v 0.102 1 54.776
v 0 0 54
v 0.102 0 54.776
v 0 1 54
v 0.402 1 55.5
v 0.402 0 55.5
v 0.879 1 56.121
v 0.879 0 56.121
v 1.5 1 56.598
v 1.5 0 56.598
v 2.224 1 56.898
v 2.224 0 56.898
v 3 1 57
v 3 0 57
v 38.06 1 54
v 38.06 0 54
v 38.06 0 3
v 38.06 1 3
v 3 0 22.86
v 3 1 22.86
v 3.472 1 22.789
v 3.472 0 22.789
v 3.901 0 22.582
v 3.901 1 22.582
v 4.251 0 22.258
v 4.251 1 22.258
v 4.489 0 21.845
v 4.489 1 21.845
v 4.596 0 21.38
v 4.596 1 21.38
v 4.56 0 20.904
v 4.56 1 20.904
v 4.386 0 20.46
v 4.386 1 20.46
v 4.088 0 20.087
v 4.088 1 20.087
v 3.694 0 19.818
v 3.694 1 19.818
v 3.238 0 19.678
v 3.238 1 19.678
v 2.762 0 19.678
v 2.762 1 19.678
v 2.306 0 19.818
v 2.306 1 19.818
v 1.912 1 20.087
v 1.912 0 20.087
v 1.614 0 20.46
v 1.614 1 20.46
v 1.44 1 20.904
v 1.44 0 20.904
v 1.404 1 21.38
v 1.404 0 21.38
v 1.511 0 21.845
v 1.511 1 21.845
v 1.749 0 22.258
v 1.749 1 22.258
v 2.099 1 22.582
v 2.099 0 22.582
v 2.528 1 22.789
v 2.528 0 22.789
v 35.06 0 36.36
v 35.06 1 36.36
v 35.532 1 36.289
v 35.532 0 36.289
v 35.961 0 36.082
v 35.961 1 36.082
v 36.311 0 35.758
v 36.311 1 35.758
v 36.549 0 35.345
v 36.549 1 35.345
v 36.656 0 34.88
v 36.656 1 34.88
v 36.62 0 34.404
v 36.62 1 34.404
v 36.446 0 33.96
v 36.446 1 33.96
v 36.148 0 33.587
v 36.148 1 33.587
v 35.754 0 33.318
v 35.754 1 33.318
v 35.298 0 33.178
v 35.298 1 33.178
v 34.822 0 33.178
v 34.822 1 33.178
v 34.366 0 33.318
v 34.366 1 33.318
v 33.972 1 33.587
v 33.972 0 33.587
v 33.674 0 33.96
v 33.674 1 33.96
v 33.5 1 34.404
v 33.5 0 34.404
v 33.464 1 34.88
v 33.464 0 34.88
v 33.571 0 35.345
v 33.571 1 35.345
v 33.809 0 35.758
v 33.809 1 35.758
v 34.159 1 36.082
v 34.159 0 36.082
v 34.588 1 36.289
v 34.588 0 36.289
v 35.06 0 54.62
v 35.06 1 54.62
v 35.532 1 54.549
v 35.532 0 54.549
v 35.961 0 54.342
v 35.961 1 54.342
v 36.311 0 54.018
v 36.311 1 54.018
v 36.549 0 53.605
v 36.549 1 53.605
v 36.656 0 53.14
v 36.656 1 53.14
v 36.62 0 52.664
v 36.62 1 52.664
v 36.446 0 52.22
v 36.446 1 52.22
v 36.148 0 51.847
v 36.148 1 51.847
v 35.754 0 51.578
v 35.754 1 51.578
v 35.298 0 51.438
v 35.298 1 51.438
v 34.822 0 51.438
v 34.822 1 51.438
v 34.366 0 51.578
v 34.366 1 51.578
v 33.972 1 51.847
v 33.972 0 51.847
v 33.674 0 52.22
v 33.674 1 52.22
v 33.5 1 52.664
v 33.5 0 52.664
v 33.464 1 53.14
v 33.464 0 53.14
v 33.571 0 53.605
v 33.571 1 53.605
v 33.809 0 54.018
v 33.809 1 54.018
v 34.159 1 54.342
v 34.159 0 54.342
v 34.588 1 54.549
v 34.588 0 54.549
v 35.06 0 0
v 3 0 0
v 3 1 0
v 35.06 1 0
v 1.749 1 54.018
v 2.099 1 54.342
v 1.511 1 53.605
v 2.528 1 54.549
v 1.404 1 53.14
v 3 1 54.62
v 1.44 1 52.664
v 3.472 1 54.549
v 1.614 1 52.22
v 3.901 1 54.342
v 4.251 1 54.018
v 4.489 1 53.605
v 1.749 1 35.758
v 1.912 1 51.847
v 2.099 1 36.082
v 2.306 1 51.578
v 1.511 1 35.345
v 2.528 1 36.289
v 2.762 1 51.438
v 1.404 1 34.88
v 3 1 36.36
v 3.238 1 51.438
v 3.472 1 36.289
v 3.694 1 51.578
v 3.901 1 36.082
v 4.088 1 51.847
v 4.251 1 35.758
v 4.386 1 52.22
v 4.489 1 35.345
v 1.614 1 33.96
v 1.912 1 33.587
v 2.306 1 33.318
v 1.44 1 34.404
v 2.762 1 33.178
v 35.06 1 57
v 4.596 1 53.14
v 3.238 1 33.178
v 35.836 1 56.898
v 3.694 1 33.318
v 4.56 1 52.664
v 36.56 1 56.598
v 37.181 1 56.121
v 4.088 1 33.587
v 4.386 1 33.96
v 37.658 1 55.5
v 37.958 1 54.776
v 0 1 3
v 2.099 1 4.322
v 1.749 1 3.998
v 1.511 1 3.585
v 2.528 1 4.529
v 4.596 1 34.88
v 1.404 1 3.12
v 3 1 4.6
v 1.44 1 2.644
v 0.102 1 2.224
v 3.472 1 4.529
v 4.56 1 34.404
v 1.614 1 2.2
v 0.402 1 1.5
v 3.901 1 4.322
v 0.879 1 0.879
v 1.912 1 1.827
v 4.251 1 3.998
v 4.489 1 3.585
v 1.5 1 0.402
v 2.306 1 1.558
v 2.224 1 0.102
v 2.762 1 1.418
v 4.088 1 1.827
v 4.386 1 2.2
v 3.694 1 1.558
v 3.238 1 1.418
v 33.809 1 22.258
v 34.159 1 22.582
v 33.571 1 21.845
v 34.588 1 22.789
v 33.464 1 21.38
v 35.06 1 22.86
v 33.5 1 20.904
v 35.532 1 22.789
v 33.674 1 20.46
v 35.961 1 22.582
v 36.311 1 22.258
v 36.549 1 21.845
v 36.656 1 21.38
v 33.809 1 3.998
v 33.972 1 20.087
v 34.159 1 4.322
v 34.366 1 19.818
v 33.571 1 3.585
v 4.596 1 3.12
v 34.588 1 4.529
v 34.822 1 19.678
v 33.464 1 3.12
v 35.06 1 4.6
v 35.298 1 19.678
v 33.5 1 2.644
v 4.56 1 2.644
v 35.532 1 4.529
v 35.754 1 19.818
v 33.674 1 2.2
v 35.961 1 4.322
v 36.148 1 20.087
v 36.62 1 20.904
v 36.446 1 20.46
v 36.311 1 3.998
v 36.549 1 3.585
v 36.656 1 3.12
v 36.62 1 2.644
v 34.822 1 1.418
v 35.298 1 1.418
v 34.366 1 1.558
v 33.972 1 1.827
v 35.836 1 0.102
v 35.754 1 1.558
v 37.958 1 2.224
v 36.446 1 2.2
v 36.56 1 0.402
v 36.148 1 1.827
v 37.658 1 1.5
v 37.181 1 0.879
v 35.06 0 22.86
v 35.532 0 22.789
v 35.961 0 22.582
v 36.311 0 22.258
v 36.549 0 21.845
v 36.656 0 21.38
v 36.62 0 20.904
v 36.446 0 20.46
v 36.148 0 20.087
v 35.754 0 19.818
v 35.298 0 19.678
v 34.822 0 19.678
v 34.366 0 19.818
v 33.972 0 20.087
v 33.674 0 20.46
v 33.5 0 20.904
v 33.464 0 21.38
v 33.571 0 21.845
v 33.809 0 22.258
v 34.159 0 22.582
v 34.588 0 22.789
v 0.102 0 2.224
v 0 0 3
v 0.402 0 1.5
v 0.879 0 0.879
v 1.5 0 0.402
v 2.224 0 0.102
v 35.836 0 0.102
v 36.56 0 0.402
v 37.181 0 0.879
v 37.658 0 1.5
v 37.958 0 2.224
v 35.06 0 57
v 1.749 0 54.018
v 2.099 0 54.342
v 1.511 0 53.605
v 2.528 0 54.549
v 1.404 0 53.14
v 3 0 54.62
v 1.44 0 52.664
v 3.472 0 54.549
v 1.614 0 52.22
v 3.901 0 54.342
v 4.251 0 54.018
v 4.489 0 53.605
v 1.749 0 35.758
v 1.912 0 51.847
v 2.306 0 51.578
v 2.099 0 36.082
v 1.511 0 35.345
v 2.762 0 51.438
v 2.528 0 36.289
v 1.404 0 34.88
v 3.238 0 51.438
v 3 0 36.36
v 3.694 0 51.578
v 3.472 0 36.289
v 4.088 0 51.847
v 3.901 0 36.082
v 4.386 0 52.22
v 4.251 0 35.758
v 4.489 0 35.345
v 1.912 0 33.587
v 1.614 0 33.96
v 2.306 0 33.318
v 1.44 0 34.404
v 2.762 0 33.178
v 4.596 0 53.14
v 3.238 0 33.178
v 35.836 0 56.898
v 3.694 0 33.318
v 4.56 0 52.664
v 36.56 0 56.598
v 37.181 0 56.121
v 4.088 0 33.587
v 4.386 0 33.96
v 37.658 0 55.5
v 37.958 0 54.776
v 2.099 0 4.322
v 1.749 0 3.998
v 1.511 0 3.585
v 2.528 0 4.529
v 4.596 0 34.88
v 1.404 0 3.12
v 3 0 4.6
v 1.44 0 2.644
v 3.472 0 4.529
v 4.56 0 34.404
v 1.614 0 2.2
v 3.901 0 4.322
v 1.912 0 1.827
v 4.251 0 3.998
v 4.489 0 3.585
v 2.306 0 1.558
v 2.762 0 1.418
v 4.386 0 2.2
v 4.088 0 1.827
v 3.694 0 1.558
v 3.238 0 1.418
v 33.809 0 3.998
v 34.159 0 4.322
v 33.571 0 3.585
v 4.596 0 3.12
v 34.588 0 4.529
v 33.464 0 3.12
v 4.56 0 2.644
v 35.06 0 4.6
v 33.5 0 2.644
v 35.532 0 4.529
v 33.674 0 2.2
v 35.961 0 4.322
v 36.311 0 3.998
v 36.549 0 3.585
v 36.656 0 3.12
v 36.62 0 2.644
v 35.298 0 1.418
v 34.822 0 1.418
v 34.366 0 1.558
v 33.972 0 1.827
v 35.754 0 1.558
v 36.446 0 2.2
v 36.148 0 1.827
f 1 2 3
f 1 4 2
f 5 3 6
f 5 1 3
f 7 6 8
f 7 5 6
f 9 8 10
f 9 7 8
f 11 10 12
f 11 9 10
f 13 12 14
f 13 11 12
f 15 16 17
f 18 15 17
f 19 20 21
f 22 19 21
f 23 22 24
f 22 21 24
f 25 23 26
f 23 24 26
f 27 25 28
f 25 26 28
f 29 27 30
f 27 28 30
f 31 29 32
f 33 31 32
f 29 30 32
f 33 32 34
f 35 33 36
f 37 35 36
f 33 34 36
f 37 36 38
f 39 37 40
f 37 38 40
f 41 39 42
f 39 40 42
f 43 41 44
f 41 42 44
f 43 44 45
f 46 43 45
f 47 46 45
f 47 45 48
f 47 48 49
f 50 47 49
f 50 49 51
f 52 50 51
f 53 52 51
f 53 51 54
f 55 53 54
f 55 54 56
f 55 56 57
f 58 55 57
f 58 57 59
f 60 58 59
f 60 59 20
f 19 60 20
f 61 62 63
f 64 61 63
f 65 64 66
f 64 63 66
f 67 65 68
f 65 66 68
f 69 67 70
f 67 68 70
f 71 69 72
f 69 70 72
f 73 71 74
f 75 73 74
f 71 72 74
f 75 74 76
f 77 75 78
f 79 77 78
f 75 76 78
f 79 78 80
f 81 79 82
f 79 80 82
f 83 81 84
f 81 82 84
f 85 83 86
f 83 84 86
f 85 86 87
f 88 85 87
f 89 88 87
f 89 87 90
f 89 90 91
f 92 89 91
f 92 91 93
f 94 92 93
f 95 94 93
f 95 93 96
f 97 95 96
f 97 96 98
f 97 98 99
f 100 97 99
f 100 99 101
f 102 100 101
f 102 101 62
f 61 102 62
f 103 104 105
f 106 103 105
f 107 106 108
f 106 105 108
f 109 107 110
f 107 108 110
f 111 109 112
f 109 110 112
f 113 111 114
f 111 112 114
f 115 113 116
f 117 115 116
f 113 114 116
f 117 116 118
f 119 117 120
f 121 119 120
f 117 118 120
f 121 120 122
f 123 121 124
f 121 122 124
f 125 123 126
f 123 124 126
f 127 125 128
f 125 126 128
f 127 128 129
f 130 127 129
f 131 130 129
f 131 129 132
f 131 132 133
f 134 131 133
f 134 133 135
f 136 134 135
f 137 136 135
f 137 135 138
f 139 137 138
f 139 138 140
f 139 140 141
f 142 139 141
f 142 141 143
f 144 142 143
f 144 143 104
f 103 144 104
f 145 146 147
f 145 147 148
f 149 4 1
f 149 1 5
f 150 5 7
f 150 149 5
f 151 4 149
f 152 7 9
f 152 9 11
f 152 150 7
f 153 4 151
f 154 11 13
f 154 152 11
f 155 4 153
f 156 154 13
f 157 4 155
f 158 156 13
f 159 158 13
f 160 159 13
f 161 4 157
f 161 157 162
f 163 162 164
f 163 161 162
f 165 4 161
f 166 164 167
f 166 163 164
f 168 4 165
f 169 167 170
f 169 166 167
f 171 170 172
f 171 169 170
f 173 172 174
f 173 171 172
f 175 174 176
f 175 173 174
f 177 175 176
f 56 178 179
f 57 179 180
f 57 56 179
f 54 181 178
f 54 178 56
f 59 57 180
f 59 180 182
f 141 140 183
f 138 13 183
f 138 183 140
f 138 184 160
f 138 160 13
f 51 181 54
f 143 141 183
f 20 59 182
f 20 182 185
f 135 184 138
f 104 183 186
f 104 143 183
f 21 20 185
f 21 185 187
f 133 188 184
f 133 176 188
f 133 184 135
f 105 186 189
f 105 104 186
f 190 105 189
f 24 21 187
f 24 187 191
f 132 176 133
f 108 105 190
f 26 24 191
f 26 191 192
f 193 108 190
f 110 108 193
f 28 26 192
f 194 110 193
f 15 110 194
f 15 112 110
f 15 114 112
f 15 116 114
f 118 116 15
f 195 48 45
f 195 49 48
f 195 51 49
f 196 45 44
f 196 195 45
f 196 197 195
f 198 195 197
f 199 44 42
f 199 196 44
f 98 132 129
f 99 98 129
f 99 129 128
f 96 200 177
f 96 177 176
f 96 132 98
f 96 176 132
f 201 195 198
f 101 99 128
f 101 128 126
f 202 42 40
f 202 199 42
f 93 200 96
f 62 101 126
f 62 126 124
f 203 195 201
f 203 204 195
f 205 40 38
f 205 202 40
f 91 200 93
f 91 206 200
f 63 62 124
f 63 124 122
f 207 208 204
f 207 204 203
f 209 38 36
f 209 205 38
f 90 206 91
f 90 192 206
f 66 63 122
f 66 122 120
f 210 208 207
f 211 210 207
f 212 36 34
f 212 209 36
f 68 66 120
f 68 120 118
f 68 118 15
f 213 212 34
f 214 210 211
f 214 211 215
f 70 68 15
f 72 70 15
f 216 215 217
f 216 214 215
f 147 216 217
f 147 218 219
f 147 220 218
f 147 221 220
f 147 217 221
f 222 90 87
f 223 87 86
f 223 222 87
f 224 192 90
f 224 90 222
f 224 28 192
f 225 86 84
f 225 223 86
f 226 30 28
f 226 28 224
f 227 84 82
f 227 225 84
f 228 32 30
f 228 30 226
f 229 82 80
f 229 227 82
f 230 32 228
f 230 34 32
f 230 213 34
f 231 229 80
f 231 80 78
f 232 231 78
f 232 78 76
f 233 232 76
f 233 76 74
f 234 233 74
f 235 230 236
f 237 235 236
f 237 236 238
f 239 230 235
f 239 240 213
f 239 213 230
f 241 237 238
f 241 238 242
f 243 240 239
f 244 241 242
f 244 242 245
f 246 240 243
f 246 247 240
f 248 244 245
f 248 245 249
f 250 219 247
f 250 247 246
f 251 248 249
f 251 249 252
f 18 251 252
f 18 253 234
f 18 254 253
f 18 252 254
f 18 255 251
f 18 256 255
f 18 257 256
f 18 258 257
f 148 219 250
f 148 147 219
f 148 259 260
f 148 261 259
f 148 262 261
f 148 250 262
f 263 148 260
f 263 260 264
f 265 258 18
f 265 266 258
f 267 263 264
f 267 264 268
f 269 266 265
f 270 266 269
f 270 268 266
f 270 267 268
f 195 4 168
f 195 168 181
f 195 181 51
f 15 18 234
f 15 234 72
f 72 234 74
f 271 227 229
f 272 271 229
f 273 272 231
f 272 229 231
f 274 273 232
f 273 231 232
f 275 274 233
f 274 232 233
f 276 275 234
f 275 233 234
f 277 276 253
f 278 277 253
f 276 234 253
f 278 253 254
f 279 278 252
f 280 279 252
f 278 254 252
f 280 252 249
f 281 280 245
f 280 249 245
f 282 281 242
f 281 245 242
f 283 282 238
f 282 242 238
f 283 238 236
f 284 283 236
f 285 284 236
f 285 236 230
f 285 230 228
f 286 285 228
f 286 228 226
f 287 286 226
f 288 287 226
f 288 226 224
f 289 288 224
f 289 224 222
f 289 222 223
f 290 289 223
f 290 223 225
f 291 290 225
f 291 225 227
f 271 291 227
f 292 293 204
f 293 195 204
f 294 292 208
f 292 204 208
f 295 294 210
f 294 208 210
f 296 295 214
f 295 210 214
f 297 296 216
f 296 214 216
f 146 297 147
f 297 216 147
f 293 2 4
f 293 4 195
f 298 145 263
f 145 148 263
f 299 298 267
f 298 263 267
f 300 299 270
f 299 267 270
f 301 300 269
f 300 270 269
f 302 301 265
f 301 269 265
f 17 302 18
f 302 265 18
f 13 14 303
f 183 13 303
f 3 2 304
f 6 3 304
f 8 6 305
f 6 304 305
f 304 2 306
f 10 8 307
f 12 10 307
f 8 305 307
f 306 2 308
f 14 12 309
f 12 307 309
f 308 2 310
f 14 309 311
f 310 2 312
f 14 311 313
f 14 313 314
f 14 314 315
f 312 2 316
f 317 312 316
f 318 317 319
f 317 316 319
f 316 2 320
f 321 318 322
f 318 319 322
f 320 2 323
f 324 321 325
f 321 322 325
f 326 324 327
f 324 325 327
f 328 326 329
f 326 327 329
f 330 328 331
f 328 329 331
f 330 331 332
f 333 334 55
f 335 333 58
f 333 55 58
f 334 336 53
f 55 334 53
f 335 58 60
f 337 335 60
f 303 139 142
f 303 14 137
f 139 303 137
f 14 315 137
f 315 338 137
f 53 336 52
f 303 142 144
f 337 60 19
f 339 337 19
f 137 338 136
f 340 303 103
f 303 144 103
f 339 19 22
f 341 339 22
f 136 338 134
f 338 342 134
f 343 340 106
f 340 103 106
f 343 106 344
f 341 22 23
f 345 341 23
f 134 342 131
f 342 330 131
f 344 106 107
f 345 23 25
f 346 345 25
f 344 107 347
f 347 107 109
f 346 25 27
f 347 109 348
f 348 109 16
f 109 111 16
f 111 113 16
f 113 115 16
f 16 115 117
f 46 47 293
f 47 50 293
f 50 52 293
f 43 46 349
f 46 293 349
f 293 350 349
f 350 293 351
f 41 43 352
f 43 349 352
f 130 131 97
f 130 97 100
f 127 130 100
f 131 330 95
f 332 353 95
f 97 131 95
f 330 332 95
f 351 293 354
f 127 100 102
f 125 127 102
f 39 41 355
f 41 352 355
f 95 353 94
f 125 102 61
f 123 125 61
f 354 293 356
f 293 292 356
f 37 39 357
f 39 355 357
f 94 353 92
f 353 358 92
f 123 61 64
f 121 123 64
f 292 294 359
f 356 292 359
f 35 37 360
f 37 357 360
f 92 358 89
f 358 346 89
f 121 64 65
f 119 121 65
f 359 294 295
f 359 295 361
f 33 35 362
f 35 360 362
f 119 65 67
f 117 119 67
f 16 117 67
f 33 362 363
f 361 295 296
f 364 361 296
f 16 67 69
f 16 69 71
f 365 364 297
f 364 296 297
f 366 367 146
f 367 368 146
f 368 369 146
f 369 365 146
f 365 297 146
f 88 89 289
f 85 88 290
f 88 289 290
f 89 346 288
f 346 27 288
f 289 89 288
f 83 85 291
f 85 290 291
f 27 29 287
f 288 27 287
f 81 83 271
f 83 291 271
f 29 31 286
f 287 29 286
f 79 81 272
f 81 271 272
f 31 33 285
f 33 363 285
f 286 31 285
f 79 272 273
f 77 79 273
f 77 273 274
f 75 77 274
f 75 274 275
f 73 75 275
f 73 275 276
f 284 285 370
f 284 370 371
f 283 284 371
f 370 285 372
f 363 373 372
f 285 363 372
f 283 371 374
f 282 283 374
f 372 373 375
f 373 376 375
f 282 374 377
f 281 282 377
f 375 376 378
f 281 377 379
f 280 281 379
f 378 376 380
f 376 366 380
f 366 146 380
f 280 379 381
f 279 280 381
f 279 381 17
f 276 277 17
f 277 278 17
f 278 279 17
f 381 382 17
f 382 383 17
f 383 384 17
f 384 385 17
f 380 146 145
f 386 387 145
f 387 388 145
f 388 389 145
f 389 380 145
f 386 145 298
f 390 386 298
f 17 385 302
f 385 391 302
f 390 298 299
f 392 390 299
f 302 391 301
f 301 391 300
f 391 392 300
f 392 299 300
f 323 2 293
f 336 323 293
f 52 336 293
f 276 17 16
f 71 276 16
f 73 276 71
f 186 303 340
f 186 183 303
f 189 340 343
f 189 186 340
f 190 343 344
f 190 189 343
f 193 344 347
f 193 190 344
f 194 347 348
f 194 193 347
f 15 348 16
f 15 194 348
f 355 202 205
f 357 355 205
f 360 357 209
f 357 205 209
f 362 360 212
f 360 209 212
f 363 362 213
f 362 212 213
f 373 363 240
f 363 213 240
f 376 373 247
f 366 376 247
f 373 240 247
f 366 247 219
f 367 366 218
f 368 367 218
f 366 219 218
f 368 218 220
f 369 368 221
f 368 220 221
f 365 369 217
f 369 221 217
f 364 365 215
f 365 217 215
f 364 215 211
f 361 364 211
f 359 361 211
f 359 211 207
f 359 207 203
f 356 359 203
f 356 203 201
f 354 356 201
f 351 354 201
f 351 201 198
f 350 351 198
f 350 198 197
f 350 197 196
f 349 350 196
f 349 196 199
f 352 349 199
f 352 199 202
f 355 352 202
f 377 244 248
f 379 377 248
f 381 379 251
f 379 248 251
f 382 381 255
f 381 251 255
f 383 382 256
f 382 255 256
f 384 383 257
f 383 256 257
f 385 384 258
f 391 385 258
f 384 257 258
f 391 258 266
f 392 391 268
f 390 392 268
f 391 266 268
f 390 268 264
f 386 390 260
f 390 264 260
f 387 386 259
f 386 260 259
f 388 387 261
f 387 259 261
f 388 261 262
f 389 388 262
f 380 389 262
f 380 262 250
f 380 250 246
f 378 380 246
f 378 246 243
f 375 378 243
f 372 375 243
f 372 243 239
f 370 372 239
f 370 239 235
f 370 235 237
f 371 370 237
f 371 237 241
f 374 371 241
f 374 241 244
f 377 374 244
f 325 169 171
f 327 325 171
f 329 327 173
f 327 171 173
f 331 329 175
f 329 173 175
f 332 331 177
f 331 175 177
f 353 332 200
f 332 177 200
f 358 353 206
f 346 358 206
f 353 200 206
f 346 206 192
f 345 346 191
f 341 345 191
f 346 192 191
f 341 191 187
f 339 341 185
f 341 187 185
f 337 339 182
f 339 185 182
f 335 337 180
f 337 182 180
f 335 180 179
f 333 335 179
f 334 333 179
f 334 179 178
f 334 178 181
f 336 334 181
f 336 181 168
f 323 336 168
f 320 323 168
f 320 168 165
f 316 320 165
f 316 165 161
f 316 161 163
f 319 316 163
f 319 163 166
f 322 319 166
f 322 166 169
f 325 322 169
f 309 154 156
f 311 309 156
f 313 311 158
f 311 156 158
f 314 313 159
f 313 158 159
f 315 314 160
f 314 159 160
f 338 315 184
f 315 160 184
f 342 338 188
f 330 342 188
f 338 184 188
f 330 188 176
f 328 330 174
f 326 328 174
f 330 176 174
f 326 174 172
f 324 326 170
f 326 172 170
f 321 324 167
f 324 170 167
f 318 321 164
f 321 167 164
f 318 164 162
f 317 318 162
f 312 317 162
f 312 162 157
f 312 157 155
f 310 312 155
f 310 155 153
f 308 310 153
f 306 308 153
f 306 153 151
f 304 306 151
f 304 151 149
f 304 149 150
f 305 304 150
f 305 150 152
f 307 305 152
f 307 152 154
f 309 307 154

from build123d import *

# Parameters (mm, degrees)
SKETCH2_W           = 38.06
SKETCH2_H           = 57
SKETCH2_R           = 1.53
BOSS_EXTRUDE1_DEPTH = 1
FILLET2_R           = 3
SKETCH4_R           = 1.6
CUT_EXTRUDE1_DEPTH  = 69.54606918


with BuildPart() as part:
    # Sketch2 → Boss-Extrude1 (new body)
    with BuildSketch(Plane(origin=(0, 0, 0), x_dir=(1, 0, 0), z_dir=(0, 1, 0))):
        with Locations((19.03, -28.5)):
            Rectangle(SKETCH2_W, SKETCH2_H)
        with Locations(Location((3, -3, 0), (0, 0, 270))):
            Circle(SKETCH2_R, mode=Mode.SUBTRACT)
        with Locations(Location((3, -21.26, 0), (0, 0, 270))):
            Circle(SKETCH2_R, mode=Mode.SUBTRACT)
        with Locations(Location((3, -34.76, 0), (0, 0, 270))):
            Circle(SKETCH2_R, mode=Mode.SUBTRACT)
        with Locations(Location((3, -53.02, 0), (0, 0, 270))):
            Circle(SKETCH2_R, mode=Mode.SUBTRACT)
        with Locations(Location((35.06, -53.02, 0), (0, 0, 270))):
            Circle(SKETCH2_R, mode=Mode.SUBTRACT)
        with Locations(Location((35.06, -34.76, 0), (0, 0, 270))):
            Circle(SKETCH2_R, mode=Mode.SUBTRACT)
        with Locations(Location((35.06, -21.26, 0), (0, 0, 270))):
            Circle(SKETCH2_R, mode=Mode.SUBTRACT)
        with Locations(Location((35.06, -3, 0), (0, 0, 270))):
            Circle(SKETCH2_R, mode=Mode.SUBTRACT)
    extrude(amount=BOSS_EXTRUDE1_DEPTH)

    # Fillet2
    fillet2_edges = [part.edges().sort_by_distance(p)[0] for p in [
        (38.06, 0.5, 57),
        (0, 0.5, 57),
        (0, 0.5, 0),
        (38.06, 0.5, 0),
    ]]
    fillet(fillet2_edges, radius=FILLET2_R)

    # Sketch4 → Cut-Extrude1 (cut, through all)
    with BuildSketch(Plane(origin=(0, 1, 0), x_dir=(1, 0, 0), z_dir=(0, 1, 0))):
        with Locations(Location((3, -3, 0), (0, 0, 270))):
            Circle(SKETCH4_R)
        with Locations(Location((3, -21.26, 0), (0, 0, 270))):
            Circle(SKETCH4_R)
        with Locations(Location((35.06, -3, 0), (0, 0, 270))):
            Circle(SKETCH4_R)
        with Locations(Location((35.06, -21.26, 0), (0, 0, 270))):
            Circle(SKETCH4_R)
        with Locations(Location((3, -34.76, 0), (0, 0, 270))):
            Circle(SKETCH4_R)
        with Locations(Location((35.06, -34.76, 0), (0, 0, 270))):
            Circle(SKETCH4_R)
        with Locations(Location((3, -53.02, 0), (0, 0, 270))):
            Circle(SKETCH4_R)
        with Locations(Location((35.06, -53.02, 0), (0, 0, 270))):
            Circle(SKETCH4_R)
    extrude(amount=-CUT_EXTRUDE1_DEPTH, mode=Mode.SUBTRACT)


solid = part.part
